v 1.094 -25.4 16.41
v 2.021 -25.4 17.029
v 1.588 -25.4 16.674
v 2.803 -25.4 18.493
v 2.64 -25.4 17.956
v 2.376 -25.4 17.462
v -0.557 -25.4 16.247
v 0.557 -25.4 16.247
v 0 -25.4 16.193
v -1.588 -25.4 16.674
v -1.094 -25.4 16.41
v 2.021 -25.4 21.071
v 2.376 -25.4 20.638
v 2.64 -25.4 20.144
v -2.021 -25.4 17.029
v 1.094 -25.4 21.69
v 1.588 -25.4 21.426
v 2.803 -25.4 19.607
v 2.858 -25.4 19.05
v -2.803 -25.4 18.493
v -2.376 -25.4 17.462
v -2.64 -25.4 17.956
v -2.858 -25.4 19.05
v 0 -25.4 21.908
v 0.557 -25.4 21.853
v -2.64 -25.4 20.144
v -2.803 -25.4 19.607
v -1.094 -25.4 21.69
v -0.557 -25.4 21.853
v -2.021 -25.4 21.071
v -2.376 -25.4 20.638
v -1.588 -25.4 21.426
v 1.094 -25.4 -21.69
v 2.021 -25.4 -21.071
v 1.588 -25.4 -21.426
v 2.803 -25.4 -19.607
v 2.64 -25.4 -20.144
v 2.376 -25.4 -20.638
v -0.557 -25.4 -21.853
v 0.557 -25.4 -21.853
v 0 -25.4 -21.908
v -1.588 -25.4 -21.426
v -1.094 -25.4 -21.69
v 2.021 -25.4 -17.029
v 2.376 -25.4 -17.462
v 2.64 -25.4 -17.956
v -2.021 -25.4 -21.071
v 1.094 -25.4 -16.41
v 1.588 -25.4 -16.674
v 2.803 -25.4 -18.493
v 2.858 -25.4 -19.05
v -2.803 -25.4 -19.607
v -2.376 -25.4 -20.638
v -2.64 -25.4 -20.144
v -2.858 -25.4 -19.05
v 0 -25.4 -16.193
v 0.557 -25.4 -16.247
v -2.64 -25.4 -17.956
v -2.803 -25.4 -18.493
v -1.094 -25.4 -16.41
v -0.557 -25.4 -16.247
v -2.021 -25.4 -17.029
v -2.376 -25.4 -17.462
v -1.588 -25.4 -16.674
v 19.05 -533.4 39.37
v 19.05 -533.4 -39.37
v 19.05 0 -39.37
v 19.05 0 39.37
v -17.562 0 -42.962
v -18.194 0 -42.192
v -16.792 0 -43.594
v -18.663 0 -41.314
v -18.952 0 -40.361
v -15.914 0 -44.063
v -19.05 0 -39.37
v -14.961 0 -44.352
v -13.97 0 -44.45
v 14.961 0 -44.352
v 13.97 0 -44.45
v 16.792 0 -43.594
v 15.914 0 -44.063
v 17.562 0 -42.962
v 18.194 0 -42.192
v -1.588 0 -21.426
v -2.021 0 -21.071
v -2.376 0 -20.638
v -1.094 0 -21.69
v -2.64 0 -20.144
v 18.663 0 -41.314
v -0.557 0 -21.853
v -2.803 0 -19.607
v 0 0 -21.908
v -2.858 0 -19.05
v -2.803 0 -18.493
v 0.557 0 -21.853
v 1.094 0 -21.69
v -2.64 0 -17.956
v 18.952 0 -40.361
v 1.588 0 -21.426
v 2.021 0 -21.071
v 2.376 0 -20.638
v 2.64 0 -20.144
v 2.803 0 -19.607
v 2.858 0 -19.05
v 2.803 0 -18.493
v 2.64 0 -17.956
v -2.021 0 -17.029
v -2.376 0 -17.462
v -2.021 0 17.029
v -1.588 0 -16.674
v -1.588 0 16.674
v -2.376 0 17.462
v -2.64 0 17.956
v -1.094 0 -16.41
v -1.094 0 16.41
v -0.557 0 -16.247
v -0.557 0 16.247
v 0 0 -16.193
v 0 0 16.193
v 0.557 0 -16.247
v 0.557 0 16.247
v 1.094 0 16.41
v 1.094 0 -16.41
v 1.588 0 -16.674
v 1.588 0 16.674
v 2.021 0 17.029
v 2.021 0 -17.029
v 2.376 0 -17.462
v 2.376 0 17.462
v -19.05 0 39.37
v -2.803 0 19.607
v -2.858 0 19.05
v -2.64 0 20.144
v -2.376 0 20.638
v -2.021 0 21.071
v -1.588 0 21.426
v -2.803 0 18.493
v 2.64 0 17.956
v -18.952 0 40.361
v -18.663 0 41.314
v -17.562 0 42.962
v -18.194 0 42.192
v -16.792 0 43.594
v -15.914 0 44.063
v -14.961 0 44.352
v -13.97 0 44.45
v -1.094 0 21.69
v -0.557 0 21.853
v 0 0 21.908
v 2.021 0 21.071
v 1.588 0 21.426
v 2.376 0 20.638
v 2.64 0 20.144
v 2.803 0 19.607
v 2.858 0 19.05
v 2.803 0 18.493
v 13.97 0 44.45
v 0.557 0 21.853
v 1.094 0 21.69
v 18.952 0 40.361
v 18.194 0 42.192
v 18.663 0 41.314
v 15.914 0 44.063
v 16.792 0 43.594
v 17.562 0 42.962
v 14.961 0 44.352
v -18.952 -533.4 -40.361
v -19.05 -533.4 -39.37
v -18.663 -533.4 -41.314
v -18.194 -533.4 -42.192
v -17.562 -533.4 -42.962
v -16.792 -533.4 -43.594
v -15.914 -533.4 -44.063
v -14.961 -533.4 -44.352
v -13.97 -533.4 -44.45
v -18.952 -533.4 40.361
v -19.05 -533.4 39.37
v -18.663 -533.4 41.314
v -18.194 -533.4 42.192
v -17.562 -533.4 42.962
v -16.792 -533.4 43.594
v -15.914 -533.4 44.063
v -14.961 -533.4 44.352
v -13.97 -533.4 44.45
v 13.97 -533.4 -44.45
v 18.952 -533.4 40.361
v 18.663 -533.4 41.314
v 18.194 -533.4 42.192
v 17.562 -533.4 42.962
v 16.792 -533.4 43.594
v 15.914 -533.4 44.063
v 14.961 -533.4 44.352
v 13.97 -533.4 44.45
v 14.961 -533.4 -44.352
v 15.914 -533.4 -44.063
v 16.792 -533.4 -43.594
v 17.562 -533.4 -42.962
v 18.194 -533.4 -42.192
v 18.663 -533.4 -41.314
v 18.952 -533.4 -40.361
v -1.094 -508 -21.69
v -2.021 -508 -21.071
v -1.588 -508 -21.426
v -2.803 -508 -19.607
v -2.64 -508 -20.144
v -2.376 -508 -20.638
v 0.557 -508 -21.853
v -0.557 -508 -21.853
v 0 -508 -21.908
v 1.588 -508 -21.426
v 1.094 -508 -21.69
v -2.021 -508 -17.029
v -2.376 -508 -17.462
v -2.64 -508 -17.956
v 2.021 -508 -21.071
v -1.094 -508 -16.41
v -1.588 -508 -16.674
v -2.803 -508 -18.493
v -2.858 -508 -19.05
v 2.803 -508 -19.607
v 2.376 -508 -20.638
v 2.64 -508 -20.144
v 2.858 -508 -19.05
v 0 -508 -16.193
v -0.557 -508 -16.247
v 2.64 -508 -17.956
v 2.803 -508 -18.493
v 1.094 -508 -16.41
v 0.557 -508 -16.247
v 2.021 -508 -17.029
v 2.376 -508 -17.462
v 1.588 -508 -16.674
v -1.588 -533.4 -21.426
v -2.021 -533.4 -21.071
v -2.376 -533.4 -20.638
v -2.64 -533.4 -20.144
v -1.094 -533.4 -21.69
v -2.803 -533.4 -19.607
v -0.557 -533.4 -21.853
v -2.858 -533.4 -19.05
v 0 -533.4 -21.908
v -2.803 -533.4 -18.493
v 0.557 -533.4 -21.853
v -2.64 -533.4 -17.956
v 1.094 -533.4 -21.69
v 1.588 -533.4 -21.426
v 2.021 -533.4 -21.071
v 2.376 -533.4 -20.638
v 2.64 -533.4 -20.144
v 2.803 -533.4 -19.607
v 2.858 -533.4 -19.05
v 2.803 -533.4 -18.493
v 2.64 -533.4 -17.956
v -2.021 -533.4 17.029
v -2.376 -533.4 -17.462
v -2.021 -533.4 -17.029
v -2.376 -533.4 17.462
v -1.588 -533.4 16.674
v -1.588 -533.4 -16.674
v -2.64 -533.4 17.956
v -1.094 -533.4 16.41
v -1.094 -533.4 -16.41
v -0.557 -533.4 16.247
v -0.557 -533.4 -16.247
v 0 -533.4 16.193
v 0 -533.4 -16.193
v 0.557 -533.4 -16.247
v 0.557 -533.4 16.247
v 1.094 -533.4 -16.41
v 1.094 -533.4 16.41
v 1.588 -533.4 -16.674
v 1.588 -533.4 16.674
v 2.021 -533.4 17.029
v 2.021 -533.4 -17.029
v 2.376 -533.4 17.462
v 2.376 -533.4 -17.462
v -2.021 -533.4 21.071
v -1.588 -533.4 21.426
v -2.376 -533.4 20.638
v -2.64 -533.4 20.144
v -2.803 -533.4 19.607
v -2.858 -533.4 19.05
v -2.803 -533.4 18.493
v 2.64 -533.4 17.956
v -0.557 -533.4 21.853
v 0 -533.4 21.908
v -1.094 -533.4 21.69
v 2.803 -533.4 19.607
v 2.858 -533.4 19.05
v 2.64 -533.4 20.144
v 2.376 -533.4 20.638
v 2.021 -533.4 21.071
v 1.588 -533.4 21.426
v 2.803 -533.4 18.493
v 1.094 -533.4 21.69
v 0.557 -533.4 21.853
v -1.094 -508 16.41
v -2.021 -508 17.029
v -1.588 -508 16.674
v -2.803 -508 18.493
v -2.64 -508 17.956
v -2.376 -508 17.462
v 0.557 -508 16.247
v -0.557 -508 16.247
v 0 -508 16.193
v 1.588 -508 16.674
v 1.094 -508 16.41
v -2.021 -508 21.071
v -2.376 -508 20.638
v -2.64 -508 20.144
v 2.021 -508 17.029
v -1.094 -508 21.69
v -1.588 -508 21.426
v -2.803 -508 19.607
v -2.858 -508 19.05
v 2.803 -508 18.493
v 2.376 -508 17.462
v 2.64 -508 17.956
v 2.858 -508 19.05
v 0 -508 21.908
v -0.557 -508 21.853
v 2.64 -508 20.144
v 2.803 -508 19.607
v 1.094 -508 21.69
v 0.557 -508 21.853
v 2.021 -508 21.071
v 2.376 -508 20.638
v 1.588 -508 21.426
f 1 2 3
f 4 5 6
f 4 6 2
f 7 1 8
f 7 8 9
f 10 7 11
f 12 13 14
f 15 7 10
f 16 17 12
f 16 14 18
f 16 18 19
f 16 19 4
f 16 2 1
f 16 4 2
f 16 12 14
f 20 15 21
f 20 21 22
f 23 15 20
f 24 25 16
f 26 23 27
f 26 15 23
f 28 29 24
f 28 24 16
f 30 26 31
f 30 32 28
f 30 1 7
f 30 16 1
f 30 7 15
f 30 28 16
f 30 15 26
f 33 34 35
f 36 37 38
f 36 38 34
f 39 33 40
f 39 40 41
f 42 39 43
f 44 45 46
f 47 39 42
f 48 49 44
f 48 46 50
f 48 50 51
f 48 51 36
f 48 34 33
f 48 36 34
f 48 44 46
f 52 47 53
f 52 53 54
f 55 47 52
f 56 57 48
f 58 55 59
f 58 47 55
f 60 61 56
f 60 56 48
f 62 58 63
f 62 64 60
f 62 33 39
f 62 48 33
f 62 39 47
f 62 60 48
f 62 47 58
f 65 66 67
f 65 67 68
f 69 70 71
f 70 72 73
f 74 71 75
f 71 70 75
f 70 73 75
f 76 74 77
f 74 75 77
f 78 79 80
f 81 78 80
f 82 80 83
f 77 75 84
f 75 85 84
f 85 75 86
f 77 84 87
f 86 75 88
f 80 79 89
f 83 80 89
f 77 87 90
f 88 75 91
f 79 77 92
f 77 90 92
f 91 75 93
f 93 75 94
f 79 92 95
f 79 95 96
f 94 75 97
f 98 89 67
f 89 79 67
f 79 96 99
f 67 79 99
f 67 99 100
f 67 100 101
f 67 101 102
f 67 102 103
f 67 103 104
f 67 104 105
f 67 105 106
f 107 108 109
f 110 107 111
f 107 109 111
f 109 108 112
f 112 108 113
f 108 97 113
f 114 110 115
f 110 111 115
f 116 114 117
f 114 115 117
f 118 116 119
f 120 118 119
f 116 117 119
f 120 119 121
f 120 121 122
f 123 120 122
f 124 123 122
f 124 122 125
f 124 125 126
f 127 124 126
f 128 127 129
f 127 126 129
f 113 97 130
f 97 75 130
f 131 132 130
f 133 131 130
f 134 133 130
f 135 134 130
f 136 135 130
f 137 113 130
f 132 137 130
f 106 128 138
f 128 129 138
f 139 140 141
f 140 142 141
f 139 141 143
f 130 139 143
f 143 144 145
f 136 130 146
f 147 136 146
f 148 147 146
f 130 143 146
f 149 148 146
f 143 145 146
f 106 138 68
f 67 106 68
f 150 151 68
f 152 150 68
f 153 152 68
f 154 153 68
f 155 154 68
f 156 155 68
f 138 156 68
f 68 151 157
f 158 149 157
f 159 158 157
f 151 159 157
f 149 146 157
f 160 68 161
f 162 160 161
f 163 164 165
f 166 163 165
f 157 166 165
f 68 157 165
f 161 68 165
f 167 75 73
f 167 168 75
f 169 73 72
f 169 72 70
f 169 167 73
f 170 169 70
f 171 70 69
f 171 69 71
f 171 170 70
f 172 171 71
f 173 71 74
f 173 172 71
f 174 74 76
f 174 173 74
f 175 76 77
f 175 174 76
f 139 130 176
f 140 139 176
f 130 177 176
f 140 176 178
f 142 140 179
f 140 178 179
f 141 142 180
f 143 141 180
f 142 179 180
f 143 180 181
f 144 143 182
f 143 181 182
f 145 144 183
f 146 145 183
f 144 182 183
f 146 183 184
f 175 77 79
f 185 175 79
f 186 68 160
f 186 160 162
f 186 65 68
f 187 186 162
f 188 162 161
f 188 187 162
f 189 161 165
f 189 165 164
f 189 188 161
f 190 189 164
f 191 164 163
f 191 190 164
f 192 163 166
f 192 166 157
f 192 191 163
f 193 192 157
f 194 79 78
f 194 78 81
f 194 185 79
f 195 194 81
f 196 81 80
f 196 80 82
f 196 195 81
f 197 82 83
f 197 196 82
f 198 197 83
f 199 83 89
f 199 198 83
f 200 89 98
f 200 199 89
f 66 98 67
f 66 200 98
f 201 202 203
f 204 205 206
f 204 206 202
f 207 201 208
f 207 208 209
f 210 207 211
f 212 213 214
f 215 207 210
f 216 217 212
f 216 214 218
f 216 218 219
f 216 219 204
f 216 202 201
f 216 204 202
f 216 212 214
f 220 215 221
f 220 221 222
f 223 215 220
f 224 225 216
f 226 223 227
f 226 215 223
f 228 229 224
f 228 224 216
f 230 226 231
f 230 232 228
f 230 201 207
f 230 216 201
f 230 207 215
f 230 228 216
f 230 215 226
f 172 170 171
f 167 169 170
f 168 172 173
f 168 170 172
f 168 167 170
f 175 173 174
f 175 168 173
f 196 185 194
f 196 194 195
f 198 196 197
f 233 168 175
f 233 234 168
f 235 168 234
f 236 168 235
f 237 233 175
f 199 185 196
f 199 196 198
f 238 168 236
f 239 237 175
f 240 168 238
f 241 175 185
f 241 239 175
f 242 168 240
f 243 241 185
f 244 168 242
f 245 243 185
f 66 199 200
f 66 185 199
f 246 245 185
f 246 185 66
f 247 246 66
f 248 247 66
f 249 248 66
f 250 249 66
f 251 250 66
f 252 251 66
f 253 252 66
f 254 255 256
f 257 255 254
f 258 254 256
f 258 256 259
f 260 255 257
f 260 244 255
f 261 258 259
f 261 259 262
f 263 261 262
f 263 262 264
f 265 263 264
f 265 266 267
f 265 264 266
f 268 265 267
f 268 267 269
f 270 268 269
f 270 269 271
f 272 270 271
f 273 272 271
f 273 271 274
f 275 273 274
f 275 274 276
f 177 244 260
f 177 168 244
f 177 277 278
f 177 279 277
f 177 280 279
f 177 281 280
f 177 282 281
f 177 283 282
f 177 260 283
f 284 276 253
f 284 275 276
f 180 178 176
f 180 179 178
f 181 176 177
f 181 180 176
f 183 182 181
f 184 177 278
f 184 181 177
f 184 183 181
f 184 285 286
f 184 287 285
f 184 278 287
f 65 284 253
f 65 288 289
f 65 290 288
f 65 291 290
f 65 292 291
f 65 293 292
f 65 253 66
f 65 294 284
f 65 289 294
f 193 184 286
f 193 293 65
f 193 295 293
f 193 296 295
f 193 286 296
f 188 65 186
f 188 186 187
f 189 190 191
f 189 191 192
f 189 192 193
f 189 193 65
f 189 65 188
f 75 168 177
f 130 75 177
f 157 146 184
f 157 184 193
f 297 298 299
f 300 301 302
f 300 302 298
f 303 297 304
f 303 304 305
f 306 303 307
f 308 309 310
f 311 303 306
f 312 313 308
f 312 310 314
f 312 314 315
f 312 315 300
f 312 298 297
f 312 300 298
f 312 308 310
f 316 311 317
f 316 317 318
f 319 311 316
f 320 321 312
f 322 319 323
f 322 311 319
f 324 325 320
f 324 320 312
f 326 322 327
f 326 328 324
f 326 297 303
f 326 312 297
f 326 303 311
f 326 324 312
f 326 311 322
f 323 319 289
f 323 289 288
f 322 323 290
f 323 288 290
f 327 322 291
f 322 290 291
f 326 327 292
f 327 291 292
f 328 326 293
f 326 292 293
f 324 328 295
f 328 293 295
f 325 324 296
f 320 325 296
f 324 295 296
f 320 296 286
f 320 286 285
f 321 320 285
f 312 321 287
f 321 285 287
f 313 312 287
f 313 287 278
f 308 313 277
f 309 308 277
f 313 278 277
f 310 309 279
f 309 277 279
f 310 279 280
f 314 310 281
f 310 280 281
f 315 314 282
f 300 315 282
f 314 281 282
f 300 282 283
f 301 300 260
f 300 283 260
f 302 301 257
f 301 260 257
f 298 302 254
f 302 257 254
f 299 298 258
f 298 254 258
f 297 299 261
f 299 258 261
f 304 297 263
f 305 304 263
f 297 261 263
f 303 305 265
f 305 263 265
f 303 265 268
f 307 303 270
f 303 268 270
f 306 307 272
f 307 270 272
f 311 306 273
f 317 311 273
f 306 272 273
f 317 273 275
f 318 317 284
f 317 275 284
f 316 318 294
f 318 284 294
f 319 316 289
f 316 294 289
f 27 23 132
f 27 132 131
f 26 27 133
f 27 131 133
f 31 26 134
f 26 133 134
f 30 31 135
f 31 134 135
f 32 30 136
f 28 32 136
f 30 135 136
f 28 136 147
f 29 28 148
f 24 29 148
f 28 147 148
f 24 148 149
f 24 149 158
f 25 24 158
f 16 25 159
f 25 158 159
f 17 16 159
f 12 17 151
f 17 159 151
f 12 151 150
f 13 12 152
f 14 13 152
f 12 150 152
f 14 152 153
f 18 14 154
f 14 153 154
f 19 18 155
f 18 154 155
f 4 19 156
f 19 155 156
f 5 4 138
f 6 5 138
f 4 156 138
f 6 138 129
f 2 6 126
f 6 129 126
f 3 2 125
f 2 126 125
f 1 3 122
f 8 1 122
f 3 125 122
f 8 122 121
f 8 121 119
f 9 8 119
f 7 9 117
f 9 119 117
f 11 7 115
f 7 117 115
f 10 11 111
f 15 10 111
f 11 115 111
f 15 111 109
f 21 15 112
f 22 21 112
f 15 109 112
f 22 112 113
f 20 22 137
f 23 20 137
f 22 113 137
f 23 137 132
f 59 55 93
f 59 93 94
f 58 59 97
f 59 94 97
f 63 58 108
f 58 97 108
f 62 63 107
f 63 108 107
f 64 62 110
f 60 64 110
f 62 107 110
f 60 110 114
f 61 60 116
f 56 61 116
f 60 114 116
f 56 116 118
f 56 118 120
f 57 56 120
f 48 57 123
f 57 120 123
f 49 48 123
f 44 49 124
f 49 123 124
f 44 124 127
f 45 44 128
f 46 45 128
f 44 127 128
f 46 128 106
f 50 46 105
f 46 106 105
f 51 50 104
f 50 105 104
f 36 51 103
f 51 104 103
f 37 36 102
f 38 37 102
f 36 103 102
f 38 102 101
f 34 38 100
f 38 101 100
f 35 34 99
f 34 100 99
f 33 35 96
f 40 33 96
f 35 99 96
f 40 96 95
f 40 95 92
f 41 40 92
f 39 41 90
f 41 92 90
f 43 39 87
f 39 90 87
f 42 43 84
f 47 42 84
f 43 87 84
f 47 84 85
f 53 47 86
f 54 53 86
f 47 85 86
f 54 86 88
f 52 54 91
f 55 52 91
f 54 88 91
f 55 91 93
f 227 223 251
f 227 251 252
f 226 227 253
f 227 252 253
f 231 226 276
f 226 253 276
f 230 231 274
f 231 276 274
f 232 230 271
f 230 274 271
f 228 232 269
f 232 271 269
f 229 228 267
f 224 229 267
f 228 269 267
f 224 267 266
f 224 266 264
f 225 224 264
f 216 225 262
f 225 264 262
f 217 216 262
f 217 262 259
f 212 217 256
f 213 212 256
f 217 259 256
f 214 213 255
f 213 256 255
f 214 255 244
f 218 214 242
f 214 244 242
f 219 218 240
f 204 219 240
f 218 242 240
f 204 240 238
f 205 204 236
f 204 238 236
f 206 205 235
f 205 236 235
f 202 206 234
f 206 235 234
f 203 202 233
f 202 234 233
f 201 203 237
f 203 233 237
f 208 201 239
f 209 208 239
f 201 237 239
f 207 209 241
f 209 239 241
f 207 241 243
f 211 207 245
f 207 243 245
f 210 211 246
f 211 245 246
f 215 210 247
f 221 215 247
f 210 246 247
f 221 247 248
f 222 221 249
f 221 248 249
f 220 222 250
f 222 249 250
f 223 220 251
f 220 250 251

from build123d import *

# Parameters (mm, degrees)
F0_W     = 38.1
F0_H     = 88.9
F1_DEPTH = 533.4
F2_R     = 5.08
F3_R     = 2.8575
F4_DEPTH = 25.4
F5_R     = 2.8575
F6_DEPTH = 25.4


with BuildPart() as f1:
    # F0 (on Front) → F1 (new body)
    with BuildSketch(Plane.XZ):
        Rectangle(F0_W, F0_H)
    extrude(amount=F1_DEPTH)

    # F2
    f2_edges = [f1.edges().sort_by_distance(p)[0] for p in [
        (19.05, -266.7, 44.45),
        (-19.05, -266.7, 44.45),
        (19.05, -266.7, -44.45),
        (-19.05, -266.7, -44.45),
    ]]
    fillet(f2_edges, radius=F2_R)

    # F3 (on face) → F4 (cut)
    with BuildSketch(Plane.XZ.offset(533.4)):
        with Locations((0, -19.05)):
            Circle(F3_R)
        with Locations((0, 19.05)):
            Circle(F3_R)
    extrude(amount=-F4_DEPTH, mode=Mode.SUBTRACT)

    # F5 (on face) → F6 (cut)
    with BuildSketch(Plane(origin=(0, 0, 0), x_dir=(-1, 0, 0), z_dir=(0, 1, 0))):
        with Locations((0, 19.05)):
            Circle(F5_R)
        with Locations((0, -19.05)):
            Circle(F5_R)
    extrude(amount=-F6_DEPTH, mode=Mode.SUBTRACT)


solid = f1.part
